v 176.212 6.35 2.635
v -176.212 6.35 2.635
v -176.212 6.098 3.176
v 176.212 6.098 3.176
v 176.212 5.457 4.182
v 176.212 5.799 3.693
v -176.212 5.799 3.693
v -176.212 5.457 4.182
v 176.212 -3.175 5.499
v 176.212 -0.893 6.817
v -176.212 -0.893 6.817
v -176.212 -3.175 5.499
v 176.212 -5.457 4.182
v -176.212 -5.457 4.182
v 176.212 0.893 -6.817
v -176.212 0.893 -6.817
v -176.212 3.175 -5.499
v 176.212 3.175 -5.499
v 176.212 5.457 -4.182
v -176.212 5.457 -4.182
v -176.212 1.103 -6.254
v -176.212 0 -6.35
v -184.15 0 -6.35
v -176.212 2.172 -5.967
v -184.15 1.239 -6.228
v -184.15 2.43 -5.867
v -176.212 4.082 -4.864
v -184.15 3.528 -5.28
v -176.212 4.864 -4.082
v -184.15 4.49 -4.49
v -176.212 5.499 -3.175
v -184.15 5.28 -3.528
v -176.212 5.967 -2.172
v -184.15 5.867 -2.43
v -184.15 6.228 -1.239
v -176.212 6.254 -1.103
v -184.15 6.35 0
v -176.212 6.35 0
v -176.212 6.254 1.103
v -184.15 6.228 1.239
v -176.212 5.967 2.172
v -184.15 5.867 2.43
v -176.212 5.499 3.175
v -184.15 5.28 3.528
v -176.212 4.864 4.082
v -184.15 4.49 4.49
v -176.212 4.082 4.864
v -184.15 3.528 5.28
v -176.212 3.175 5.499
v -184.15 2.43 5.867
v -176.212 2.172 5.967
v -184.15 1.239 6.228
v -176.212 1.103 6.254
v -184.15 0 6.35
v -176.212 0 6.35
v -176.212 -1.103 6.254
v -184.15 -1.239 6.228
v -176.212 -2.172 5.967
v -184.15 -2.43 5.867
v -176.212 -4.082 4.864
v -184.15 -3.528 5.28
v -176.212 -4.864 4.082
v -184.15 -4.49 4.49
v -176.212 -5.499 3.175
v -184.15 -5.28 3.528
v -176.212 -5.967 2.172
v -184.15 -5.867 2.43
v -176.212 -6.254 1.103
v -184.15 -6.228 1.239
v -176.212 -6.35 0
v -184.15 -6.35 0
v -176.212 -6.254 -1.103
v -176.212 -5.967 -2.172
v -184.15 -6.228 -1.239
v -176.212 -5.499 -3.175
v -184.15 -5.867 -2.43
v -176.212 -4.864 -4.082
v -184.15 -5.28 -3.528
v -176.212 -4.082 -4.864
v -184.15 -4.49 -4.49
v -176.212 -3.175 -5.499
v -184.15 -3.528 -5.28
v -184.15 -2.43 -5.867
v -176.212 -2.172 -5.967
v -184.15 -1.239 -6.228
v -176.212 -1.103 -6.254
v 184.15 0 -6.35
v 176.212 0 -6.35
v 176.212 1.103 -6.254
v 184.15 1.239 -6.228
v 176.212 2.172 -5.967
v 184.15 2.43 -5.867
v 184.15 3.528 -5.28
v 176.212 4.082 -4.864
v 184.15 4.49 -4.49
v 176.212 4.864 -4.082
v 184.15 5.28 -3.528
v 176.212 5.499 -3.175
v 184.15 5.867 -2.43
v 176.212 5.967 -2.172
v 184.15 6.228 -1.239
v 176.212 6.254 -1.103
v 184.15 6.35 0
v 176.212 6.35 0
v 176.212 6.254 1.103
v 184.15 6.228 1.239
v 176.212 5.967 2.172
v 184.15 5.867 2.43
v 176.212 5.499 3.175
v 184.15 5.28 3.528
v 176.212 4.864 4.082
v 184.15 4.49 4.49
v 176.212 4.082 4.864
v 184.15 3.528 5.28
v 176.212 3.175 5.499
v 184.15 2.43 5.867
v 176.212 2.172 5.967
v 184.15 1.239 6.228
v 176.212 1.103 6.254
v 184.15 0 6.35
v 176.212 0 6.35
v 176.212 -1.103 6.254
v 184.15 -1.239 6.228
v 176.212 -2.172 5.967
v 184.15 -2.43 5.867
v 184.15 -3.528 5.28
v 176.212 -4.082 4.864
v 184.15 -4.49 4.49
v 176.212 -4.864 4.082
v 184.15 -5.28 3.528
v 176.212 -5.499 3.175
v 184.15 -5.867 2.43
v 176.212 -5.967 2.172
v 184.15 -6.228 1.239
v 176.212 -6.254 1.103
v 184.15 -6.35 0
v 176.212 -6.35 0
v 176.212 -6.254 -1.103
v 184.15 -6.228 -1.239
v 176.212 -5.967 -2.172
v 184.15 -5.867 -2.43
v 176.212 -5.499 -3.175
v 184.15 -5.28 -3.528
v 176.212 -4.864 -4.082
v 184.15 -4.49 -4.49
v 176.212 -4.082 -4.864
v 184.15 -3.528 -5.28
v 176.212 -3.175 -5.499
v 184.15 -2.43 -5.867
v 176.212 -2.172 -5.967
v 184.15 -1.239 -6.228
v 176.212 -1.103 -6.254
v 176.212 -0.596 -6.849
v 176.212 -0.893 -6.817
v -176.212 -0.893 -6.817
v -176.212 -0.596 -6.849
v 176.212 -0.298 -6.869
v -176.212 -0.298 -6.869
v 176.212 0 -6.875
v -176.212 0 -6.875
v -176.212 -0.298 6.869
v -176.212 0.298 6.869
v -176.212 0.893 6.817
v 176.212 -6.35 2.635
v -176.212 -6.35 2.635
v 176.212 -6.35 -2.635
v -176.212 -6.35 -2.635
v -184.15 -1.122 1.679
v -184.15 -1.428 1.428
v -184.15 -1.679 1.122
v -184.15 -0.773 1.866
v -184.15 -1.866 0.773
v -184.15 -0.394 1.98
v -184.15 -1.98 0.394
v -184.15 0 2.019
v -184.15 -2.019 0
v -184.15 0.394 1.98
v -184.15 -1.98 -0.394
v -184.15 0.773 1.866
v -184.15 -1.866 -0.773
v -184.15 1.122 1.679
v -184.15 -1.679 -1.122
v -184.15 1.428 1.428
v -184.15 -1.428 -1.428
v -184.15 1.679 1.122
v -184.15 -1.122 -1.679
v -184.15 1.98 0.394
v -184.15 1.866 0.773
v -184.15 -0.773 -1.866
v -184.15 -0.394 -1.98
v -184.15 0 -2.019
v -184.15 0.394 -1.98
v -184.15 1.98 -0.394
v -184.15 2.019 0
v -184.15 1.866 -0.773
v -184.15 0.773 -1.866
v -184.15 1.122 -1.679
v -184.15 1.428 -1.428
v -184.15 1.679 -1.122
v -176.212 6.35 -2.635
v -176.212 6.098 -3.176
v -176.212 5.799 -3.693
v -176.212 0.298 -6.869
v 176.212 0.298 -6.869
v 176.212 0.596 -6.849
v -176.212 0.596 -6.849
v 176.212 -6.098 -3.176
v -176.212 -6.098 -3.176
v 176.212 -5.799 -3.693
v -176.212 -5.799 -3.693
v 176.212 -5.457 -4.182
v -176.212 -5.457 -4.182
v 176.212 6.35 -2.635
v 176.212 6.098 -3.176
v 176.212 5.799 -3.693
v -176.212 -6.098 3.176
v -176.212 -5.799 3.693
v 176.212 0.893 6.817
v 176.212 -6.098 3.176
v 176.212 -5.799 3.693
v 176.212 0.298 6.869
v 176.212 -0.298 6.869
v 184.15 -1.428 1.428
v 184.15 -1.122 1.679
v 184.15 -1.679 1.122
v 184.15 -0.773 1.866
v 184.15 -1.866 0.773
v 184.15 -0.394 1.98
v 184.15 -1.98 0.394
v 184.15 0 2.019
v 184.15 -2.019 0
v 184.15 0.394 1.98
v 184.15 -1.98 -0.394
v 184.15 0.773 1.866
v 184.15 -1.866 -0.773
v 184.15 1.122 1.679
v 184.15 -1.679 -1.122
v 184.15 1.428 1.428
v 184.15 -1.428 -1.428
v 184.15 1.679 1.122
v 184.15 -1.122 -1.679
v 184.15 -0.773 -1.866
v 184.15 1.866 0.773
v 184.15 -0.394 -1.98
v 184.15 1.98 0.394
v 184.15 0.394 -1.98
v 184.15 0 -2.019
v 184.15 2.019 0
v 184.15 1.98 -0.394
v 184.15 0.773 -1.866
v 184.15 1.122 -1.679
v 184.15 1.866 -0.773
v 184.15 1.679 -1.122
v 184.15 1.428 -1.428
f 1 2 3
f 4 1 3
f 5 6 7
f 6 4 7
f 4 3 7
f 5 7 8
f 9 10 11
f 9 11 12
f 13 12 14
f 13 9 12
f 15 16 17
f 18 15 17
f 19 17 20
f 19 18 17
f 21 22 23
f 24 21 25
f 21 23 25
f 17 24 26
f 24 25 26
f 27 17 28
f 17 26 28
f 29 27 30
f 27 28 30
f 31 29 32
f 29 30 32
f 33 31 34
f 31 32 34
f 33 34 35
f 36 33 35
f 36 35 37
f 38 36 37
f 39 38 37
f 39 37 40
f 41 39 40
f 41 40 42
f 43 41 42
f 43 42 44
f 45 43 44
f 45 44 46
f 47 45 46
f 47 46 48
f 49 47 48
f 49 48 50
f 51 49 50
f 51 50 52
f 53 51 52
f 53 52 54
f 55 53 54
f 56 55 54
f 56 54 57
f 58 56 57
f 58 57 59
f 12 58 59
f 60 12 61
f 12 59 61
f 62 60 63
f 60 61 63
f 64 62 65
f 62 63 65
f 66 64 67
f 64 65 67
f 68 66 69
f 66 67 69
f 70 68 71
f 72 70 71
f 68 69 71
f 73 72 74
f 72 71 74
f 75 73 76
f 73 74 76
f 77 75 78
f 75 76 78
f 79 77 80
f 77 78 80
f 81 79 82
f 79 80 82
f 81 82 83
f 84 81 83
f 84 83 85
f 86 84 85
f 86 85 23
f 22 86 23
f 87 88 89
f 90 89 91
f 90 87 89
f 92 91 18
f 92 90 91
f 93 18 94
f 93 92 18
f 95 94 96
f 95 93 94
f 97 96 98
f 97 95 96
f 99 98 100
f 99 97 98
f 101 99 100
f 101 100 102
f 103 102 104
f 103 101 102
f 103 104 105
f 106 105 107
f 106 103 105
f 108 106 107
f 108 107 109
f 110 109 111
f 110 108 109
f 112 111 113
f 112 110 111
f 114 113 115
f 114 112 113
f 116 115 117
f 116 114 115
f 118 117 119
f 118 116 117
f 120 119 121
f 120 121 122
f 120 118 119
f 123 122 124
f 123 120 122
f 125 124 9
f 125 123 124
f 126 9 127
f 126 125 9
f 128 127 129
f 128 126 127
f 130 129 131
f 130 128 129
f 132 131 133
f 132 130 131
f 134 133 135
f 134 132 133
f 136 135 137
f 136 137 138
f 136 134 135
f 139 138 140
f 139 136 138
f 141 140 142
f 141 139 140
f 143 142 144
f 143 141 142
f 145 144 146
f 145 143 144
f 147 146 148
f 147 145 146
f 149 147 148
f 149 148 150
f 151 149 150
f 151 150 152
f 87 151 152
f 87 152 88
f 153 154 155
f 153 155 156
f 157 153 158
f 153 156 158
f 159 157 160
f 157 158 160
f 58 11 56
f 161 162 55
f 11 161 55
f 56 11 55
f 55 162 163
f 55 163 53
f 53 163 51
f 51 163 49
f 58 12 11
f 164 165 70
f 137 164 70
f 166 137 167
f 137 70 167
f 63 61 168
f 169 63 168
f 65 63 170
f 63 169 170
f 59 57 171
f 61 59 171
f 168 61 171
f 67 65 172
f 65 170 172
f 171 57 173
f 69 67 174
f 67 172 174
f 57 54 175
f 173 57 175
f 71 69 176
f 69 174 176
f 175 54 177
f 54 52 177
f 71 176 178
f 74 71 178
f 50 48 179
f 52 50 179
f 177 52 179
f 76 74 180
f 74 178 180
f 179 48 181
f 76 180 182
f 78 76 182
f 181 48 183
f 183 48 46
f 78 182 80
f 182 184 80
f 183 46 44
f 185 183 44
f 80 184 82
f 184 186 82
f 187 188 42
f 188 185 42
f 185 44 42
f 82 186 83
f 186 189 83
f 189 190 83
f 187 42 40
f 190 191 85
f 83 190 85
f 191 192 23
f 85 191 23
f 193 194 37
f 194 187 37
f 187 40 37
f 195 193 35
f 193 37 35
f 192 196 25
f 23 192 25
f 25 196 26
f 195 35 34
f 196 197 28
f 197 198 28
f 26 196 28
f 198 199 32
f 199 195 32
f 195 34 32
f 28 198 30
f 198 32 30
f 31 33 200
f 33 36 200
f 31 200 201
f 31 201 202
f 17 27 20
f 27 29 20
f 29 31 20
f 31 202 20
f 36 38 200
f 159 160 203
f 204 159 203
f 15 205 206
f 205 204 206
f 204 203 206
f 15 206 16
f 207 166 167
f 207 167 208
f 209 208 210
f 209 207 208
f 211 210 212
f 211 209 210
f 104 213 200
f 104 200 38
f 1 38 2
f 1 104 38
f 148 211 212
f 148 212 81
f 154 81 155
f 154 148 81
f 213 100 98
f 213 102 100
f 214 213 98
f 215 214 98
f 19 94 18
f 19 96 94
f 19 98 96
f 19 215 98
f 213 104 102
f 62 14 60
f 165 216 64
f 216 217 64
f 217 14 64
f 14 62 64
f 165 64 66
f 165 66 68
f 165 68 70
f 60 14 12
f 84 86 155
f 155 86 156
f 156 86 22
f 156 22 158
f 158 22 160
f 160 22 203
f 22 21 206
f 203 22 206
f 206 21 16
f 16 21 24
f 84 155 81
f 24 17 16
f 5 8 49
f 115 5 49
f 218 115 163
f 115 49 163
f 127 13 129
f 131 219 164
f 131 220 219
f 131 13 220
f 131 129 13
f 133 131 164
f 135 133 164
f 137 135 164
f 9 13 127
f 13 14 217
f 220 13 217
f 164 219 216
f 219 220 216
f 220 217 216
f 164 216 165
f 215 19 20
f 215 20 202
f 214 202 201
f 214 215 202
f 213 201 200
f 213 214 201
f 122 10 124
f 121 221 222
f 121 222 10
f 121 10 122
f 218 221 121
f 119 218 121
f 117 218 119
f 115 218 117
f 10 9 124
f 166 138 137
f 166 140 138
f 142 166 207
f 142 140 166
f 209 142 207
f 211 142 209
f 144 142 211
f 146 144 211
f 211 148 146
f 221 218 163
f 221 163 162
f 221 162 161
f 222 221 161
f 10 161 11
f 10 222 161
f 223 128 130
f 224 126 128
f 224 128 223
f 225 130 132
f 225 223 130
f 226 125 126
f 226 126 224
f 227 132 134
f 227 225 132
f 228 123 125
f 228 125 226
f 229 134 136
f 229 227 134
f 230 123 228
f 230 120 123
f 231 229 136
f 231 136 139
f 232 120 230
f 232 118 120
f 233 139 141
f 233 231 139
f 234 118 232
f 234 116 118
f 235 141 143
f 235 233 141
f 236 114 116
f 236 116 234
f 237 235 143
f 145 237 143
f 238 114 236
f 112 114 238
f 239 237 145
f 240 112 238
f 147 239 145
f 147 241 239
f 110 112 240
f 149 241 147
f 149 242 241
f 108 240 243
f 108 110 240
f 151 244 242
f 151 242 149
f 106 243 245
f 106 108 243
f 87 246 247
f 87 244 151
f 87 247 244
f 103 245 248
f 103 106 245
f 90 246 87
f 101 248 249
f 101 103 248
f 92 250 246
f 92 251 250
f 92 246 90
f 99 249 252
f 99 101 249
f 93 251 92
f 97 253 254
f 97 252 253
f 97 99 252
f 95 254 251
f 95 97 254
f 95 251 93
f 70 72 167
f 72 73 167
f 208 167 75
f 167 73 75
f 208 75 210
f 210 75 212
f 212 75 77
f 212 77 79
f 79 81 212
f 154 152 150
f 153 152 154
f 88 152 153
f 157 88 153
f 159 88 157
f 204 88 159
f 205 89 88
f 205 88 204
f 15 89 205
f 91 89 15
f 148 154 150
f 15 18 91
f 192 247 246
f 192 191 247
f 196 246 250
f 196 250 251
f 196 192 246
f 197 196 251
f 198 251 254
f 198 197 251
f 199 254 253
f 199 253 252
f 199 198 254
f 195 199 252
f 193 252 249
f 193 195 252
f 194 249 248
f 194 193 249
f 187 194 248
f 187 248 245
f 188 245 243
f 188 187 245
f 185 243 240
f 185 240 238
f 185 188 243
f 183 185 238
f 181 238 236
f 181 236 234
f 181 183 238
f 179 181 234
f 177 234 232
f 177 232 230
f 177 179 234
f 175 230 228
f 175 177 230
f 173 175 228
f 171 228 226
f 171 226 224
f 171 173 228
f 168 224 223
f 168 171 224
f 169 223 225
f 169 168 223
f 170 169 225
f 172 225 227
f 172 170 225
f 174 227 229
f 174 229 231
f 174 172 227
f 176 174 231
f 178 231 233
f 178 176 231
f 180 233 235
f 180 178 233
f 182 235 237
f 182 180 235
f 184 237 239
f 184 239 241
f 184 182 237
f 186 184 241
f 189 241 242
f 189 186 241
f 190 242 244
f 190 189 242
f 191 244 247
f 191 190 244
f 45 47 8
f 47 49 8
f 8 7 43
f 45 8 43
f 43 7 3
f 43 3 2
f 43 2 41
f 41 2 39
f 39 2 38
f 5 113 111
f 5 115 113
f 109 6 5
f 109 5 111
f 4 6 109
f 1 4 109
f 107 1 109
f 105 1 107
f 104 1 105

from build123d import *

# Parameters (mm, degrees)
SKETCH1_R               = 2.0193
BOSS_EXTRUDE1_DEPTH     = 184.15
SKETCH2_R               = 8.89
SKETCH2_R_2             = 6.35
CUT_EXTRUDE_THIN1_DEPTH = 7.9375


with BuildPart() as part:
    # Sketch1 → Boss-Extrude1 (new, symmetric)
    with BuildSketch(Plane(origin=(0, 0, 0), x_dir=(0, 0, -1), z_dir=(1, 0, 0))):
        with BuildLine():
            ThreePointArc((4.181770846, 5.456960429), (3.437499983, 5.953924622), (2.634980936, 6.35))
            Line((2.634980936, 6.35), (-2.634980936, 6.35))
            ThreePointArc((-2.634980936, 6.35), (-3.437499983, 5.953924622), (-4.181770846, 5.456960429))
            Line((-4.181770846, 5.456960429), (-6.816751782, 0.893039571))
            ThreePointArc((-6.816751782, 0.893039571), (-6.874999966, 0), (-6.816751782, -0.893039571))
            Line((-6.816751782, -0.893039571), (-4.181770846, -5.456960429))
            ThreePointArc((-4.181770846, -5.456960429), (-3.437499983, -5.953924622), (-2.634980936, -6.35))
            Line((-2.634980936, -6.35), (2.634980936, -6.35))
            ThreePointArc((2.634980936, -6.35), (3.437499983, -5.953924622), (4.181770846, -5.456960429))
            Line((4.181770846, -5.456960429), (6.816751782, -0.893039571))
            ThreePointArc((6.816751782, -0.893039571), (6.860422465, -0.447468582), (6.874999966, 0))
            ThreePointArc((6.874999966, 0), (6.860422465, 0.447468582), (6.816751782, 0.893039571))
            Line((6.816751782, 0.893039571), (4.181770846, 5.456960429))
        make_face()
        Circle(SKETCH1_R, mode=Mode.SUBTRACT)
    extrude(amount=BOSS_EXTRUDE1_DEPTH, both=True)

    # Sketch2 → Cut-Extrude-Thin1 (cut)
    with BuildSketch(Plane(origin=(184.15, 0, 0), x_dir=(0, 0, -1), z_dir=(1, 0, 0))):
        Circle(SKETCH2_R)
        Circle(SKETCH2_R_2, mode=Mode.SUBTRACT)
    cut_extrude_thin1 = extrude(amount=-CUT_EXTRUDE_THIN1_DEPTH, mode=Mode.SUBTRACT)

    # Mirror1: Cut-Extrude-Thin1 across plane
    add(cut_extrude_thin1.mirror(Plane(origin=(0, 0, 0), x_dir=(0, 0, 1), z_dir=(1, 0, 0))), mode=Mode.SUBTRACT)


solid = part.part
